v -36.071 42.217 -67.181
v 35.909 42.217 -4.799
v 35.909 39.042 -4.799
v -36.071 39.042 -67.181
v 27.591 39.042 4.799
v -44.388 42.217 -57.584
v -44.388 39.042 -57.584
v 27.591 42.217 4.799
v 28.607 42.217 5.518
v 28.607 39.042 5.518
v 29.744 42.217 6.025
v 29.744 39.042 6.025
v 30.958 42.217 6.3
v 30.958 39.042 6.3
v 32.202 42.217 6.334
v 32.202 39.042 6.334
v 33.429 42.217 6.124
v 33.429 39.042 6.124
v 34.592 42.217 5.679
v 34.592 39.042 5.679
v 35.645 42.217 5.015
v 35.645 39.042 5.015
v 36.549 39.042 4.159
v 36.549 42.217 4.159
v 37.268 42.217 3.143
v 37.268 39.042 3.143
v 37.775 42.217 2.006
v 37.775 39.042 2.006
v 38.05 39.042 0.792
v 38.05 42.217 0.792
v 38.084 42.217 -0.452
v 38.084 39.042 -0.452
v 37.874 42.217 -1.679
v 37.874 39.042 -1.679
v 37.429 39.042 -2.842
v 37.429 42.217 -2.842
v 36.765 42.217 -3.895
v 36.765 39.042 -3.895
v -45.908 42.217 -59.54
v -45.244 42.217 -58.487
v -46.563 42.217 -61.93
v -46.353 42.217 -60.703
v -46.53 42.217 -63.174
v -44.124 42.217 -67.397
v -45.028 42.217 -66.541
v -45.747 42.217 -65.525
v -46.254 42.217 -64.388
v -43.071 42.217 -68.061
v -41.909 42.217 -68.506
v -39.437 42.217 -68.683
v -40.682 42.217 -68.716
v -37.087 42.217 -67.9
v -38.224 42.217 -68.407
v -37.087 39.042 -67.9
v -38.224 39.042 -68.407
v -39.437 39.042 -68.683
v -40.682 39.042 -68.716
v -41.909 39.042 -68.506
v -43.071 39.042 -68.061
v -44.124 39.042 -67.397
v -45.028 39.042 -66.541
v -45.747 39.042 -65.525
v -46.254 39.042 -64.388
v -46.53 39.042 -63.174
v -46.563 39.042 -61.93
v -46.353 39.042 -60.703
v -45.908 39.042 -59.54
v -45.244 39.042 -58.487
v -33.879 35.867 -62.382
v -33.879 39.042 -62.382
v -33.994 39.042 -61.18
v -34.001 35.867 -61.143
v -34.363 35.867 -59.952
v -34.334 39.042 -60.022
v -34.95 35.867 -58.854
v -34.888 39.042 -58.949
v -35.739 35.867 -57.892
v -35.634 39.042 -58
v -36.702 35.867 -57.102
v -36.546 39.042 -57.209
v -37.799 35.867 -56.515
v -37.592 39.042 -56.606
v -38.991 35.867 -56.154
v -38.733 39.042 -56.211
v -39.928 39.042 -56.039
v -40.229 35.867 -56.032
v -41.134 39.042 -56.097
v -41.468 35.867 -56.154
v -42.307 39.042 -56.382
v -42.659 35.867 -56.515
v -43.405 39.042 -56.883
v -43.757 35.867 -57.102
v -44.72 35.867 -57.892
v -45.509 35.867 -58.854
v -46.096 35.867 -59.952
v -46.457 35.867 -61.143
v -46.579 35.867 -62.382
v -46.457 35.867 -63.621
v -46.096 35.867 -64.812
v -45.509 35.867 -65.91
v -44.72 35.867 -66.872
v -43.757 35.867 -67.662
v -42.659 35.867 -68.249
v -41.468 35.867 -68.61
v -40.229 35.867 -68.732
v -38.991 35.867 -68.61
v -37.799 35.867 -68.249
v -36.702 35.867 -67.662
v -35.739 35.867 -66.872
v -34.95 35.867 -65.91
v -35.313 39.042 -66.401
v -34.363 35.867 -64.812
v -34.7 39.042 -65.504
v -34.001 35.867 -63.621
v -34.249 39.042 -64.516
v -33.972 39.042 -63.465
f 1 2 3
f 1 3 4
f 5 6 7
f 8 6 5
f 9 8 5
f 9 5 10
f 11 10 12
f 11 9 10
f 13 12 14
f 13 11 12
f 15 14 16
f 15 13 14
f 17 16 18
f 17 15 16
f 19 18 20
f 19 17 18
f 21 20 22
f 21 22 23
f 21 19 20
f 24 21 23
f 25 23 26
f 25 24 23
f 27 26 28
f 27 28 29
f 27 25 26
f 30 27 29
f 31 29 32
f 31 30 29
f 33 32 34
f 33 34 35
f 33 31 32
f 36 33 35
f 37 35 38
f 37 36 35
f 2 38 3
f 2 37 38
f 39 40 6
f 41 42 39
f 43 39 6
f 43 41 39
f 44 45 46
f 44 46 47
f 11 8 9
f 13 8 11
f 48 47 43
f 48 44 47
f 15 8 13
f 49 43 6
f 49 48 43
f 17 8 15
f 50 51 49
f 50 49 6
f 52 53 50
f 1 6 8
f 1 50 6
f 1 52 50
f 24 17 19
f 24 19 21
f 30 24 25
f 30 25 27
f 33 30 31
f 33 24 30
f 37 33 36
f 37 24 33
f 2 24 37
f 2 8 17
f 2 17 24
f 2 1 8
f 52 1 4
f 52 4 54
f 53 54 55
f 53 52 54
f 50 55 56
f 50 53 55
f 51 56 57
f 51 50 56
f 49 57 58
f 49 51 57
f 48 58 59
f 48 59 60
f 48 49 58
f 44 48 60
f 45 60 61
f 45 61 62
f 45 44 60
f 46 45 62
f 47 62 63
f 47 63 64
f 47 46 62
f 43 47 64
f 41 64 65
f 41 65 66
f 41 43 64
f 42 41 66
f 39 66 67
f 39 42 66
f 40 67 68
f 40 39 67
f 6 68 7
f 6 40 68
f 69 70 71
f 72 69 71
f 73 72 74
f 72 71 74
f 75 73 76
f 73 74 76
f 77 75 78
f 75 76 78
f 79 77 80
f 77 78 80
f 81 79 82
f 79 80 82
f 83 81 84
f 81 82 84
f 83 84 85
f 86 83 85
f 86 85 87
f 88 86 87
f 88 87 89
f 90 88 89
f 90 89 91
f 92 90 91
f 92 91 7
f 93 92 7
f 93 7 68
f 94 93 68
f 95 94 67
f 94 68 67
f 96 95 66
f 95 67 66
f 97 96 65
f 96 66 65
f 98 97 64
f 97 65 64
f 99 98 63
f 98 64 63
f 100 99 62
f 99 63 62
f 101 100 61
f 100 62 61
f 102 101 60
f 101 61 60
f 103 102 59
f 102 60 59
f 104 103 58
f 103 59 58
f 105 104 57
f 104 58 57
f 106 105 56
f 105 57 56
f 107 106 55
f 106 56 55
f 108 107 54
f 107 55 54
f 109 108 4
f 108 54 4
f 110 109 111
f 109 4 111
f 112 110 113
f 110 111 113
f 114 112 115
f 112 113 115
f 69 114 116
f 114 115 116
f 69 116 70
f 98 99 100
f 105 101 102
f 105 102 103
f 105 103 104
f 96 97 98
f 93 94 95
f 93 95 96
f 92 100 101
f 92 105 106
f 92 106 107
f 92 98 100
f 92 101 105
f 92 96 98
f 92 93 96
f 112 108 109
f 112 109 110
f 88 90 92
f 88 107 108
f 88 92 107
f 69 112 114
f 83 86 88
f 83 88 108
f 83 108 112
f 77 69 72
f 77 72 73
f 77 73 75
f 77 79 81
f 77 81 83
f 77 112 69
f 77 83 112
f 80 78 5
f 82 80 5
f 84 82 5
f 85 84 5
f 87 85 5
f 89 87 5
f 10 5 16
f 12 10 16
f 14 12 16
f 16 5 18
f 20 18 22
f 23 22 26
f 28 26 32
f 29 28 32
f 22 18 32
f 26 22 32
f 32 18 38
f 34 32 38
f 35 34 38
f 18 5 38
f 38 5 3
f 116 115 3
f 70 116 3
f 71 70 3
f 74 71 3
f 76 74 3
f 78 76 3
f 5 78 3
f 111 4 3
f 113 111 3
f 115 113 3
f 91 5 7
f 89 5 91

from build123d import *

# Parameters (mm, degrees)
BOSS_EXTRUDE1_DEPTH = 3.175
SKETCH4_R           = 6.35
BOSS_EXTRUDE2_DEPTH = 3.175


with BuildPart() as part:
    # Sketch3 → Boss-Extrude1 (new body)
    with BuildSketch(Plane(origin=(0, 42.21734, 0), x_dir=(1, 0, 0), z_dir=(0, 1, 0))):
        with BuildLine():
            Line((35.908808919, 4.798625676), (-36.070576217, 67.18075946))
            ThreePointArc((-36.070576217, 67.18075946), (-45.028010811, 66.540942703), (-44.388194055, 57.583508109))
            Line((-44.388194055, 57.583508109), (27.591191081, -4.798625676))
            ThreePointArc((27.591191081, -4.798625676), (36.548625676, -4.158808919), (35.908808919, 4.798625676))
        make_face()
    extrude(amount=-BOSS_EXTRUDE1_DEPTH)

    # Sketch4 → Boss-Extrude2 (add)
    with BuildSketch(Plane.XZ.offset(-39.04234)):
        with Locations((-40.229385136, -62.382133784)):
            Circle(SKETCH4_R)
    extrude(amount=BOSS_EXTRUDE2_DEPTH)


solid = part.part
